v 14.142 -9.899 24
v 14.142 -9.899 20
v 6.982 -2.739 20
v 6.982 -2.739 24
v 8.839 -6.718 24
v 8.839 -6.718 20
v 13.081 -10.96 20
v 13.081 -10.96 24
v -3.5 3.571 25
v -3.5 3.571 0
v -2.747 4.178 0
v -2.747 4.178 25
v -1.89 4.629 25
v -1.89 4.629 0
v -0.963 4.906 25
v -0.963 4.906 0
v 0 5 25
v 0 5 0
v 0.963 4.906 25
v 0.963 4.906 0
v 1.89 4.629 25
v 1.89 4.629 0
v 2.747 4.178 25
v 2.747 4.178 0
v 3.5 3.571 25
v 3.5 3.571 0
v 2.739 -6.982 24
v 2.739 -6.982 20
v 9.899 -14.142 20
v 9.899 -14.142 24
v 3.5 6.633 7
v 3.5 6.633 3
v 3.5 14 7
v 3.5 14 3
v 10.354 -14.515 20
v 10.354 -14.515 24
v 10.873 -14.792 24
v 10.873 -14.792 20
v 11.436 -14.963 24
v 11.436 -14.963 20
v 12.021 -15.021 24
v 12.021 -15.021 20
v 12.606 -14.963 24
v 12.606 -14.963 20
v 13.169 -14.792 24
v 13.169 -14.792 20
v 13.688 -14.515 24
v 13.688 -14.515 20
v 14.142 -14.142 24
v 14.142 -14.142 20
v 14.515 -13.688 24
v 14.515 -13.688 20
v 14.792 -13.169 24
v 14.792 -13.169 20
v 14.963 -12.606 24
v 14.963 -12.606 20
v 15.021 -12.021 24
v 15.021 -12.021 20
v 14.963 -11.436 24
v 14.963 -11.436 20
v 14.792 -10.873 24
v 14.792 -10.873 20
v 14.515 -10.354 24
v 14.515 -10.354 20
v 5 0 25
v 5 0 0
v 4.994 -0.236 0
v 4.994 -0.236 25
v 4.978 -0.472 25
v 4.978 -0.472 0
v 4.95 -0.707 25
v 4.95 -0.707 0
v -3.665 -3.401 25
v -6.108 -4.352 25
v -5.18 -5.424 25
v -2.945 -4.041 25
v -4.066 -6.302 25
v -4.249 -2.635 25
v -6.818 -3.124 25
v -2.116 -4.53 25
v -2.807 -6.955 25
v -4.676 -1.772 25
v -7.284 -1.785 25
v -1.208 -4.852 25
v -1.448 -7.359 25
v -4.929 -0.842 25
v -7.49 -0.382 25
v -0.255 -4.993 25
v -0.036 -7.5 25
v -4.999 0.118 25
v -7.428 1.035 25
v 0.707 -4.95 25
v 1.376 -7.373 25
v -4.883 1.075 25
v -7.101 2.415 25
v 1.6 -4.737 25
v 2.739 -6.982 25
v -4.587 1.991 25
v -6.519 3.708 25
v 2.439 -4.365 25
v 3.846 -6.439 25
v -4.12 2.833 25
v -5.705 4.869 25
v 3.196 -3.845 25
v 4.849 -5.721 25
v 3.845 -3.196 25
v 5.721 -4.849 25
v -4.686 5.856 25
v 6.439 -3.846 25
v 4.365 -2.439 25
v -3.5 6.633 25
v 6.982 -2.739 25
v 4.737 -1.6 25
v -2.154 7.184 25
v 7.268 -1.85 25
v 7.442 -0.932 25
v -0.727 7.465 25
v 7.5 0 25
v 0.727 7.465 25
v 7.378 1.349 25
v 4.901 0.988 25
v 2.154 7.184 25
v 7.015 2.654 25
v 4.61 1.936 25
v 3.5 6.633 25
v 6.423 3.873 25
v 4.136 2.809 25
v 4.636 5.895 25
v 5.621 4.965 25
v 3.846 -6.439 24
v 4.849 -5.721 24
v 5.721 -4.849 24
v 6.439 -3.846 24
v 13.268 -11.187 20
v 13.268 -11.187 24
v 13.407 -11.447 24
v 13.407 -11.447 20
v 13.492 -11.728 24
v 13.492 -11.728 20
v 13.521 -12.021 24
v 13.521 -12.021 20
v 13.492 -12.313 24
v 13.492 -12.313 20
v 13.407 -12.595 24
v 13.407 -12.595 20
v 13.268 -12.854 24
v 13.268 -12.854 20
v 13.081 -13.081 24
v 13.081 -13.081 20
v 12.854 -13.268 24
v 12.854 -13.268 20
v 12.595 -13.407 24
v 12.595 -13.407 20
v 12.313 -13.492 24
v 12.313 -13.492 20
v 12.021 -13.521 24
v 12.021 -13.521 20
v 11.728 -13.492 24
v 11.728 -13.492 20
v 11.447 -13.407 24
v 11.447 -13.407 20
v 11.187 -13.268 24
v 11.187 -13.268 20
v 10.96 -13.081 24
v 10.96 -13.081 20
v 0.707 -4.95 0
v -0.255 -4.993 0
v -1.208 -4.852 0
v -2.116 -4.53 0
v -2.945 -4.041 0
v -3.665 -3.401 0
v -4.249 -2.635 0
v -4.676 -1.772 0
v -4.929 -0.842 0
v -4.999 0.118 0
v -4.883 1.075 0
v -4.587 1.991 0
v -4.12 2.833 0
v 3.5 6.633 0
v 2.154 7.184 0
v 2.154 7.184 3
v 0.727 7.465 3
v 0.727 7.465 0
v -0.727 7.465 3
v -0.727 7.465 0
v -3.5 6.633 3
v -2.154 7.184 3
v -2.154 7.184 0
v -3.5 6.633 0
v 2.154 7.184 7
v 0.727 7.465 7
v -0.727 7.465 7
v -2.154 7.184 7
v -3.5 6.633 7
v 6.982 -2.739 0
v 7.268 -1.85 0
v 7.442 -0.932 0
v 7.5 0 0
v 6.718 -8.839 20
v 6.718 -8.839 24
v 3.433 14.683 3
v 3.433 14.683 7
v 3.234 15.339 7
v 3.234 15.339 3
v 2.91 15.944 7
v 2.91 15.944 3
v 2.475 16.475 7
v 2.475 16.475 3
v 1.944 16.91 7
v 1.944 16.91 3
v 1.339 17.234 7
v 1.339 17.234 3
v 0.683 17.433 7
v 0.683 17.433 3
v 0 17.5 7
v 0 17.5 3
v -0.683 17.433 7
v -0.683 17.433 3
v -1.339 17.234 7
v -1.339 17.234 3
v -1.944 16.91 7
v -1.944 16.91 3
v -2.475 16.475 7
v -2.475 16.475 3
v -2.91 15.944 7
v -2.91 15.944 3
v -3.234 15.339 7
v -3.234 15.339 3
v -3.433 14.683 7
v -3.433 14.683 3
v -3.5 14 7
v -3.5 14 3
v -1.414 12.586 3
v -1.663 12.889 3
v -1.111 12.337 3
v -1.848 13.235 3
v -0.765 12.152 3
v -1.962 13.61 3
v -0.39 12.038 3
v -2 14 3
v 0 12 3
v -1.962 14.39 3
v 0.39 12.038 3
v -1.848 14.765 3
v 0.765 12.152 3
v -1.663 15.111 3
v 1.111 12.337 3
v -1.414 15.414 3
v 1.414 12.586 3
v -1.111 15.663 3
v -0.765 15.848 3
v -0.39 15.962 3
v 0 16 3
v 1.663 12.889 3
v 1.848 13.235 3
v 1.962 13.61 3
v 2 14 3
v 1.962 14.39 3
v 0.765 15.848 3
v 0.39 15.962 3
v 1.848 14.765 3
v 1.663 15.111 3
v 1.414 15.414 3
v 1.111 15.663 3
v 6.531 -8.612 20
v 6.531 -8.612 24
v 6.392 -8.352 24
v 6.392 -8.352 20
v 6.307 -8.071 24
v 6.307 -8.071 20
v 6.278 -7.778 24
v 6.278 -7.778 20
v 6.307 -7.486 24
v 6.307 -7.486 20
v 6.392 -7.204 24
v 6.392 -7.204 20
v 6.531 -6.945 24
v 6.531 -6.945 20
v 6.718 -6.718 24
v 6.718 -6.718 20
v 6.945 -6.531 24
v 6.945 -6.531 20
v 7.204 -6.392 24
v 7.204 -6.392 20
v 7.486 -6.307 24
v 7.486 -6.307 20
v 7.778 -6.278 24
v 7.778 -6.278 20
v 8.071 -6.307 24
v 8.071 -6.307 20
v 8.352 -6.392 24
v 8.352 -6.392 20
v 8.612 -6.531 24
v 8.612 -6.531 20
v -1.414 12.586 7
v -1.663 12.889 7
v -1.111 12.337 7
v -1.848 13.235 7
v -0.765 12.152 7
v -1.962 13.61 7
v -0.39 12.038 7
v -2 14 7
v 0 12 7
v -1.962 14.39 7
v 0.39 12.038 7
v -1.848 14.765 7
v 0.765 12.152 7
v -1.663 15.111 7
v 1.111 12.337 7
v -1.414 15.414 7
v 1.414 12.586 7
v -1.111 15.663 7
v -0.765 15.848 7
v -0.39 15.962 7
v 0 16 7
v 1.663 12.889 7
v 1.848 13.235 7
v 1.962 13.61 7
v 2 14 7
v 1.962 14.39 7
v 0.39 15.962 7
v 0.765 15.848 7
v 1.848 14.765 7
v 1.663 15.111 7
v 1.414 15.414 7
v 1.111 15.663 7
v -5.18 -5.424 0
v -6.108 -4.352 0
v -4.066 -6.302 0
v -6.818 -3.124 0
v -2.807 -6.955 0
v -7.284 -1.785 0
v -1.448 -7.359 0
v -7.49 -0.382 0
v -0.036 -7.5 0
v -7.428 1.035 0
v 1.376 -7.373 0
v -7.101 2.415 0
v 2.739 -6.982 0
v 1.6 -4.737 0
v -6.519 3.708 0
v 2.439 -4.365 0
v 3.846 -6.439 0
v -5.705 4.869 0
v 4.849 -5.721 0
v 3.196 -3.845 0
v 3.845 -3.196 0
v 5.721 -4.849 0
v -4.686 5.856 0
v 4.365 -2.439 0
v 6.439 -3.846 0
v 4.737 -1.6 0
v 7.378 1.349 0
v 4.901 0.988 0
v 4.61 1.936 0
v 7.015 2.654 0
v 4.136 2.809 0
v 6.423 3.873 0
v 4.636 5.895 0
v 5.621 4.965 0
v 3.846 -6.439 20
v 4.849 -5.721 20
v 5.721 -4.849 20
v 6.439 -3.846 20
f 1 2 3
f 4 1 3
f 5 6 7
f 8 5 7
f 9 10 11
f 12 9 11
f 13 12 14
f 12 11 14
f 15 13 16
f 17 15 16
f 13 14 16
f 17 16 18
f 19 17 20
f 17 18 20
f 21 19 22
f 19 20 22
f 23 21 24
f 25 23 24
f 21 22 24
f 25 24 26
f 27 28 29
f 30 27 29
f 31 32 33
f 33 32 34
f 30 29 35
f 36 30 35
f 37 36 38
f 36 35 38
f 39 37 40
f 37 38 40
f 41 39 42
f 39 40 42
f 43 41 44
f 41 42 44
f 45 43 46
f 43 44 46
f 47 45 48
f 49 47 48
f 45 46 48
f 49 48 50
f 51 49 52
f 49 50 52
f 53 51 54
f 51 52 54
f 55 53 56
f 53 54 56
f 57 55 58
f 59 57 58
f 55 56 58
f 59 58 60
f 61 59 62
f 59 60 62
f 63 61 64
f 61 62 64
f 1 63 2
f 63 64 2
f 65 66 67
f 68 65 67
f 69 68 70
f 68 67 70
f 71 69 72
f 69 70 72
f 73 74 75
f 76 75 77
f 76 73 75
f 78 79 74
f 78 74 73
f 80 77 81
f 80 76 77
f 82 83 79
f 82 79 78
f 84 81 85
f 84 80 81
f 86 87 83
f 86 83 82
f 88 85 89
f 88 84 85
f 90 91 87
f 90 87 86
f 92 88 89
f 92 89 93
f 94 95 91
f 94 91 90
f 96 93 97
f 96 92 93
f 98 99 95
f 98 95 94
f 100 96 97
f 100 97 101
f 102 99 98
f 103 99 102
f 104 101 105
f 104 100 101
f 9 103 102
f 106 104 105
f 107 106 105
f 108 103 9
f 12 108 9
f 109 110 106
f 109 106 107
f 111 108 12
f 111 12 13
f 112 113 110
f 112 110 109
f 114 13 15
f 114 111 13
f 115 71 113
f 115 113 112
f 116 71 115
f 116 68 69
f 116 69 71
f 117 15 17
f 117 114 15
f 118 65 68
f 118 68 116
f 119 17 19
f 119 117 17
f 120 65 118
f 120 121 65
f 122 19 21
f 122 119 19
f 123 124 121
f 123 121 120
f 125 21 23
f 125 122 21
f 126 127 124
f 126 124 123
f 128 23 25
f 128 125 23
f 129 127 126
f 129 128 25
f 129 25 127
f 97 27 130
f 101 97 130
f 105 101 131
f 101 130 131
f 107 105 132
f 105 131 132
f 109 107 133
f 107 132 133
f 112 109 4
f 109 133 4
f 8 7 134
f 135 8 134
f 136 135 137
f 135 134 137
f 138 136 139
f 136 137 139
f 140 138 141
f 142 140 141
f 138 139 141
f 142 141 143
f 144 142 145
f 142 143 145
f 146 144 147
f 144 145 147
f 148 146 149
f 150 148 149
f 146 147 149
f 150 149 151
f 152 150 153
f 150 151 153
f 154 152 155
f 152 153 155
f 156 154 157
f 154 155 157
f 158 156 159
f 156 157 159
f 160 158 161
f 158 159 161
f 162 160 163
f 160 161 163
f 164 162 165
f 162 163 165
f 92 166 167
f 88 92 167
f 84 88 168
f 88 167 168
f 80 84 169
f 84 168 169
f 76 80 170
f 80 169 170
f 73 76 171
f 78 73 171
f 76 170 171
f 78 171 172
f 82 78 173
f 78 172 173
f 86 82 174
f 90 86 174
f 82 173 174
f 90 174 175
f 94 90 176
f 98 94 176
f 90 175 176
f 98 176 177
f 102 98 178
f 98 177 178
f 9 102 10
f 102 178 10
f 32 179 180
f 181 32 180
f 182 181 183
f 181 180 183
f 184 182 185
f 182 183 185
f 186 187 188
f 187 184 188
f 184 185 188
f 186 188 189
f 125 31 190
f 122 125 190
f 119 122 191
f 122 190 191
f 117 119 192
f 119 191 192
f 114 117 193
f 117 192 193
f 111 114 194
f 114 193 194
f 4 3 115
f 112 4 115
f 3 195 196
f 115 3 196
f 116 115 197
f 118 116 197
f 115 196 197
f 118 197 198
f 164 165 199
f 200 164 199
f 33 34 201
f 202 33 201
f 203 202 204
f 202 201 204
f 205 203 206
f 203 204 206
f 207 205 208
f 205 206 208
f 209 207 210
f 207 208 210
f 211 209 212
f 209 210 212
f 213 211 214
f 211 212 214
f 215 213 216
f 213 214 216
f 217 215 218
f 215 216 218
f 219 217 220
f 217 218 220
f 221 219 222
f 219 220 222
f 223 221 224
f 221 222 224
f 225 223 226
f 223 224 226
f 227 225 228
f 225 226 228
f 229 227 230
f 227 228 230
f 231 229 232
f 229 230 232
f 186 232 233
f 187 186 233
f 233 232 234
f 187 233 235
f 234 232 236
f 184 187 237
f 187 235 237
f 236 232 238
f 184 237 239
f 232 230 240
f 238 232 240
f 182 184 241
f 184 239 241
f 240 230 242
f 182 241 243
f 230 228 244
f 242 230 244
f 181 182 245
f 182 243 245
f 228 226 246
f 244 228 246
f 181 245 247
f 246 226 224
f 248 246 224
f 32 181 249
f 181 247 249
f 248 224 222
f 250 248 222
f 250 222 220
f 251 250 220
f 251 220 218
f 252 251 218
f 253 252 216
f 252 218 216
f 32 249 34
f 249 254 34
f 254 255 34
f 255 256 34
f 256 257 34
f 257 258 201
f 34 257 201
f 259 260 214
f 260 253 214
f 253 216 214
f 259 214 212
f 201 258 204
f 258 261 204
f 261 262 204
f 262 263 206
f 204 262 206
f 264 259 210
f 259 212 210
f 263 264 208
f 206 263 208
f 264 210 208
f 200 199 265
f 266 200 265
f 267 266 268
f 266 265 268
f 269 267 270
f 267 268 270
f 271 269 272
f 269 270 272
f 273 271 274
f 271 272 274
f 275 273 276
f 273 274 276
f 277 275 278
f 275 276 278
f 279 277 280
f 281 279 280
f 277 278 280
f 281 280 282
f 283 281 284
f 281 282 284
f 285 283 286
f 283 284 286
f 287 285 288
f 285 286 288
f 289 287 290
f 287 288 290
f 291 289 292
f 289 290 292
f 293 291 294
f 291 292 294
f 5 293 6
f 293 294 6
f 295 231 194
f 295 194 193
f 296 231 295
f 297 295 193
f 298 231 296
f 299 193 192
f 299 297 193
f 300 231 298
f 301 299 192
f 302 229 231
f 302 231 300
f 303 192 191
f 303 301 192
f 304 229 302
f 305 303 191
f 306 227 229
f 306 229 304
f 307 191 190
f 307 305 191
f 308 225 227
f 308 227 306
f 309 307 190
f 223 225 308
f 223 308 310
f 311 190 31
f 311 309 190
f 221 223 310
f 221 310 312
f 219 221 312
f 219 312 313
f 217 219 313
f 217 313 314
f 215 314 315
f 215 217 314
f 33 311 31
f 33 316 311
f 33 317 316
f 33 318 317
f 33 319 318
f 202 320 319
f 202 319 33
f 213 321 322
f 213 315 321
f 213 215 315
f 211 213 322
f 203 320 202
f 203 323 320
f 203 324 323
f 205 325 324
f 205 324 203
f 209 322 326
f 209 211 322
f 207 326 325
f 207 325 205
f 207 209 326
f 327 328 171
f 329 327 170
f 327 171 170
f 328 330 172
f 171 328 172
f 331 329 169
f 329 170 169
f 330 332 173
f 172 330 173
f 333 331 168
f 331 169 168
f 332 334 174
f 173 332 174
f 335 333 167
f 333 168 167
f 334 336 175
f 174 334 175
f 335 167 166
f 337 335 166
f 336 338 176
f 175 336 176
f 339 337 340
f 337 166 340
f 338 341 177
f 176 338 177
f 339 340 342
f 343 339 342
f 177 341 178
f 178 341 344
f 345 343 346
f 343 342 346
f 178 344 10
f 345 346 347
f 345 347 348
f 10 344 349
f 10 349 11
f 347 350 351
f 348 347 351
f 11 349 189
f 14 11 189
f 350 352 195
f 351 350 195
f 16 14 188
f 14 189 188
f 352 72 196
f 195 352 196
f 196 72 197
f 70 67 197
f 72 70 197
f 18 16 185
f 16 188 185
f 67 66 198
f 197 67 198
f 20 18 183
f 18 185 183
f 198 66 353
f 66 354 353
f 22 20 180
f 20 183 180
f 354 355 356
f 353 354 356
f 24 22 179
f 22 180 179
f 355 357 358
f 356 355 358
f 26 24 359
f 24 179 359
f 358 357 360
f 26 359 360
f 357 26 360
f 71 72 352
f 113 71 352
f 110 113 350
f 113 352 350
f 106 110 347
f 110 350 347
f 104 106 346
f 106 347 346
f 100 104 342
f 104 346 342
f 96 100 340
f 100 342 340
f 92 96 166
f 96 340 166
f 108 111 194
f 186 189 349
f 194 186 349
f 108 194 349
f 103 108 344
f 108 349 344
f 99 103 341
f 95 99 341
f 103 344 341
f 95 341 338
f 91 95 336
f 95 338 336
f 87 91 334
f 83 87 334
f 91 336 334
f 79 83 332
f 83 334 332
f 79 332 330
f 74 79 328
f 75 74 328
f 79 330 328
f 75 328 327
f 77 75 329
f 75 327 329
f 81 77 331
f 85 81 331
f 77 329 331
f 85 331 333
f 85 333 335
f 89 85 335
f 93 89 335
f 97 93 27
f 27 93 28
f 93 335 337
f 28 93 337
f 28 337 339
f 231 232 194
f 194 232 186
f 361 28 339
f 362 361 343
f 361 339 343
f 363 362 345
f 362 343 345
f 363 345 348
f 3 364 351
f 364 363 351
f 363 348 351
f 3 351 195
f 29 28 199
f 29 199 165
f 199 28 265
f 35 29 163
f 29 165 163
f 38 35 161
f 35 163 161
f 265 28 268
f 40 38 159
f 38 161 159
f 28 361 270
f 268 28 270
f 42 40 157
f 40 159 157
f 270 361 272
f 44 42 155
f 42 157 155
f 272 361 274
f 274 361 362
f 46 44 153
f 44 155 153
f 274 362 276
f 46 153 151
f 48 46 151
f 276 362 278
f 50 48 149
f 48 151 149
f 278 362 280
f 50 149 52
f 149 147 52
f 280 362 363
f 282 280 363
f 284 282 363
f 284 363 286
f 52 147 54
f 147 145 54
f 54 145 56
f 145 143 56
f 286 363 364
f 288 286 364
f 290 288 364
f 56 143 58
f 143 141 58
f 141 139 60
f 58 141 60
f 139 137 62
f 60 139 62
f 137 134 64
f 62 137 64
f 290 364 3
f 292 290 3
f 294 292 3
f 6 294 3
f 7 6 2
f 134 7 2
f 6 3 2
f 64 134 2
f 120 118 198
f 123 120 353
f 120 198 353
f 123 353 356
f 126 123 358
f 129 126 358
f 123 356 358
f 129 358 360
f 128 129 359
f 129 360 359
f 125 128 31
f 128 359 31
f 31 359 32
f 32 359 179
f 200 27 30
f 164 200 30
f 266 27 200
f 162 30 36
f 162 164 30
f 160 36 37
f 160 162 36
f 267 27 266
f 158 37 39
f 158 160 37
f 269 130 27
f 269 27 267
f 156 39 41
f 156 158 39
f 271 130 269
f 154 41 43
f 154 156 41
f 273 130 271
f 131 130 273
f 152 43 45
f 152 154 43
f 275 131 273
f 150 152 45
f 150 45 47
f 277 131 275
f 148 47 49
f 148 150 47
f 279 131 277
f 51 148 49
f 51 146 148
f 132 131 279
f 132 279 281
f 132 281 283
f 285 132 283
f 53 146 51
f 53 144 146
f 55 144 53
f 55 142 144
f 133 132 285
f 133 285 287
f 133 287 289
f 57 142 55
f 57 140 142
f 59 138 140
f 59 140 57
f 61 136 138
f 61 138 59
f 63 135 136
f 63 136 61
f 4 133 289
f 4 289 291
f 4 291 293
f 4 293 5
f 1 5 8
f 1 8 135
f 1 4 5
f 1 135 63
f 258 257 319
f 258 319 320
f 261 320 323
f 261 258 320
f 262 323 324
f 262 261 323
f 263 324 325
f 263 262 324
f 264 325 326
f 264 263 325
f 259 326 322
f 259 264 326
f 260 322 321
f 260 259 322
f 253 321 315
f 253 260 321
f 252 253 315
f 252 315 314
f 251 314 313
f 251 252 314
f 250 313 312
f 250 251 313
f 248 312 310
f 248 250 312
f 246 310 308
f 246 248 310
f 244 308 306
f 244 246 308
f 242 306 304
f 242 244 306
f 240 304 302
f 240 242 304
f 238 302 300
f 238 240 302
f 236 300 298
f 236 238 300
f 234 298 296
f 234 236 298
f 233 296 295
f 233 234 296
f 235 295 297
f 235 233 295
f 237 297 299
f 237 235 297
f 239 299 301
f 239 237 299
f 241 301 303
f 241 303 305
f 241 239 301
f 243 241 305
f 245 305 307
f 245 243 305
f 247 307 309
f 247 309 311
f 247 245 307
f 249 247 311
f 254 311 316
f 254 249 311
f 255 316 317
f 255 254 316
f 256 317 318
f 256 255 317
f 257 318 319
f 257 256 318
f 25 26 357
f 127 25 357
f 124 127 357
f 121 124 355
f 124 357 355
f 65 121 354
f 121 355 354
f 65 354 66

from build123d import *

# Parameters (mm, degrees)
SKETCH_1_R      = 7.5
SKETCH_1_R_2    = 5
EXTRUDE_1_DEPTH = 25
EXTRUDE_START   = 3
SKETCH_1_3_R    = 2
EXTRUDE_2_DEPTH = 4
EXTRUDE_START_2 = 20
EXTRUDE_3_DEPTH = 4


with BuildPart() as part:
    # Эскиз1 → Бобышка-Вытянуть1 (new body)
    with BuildSketch(Plane.XY):
        Circle(SKETCH_1_R)
        Circle(SKETCH_1_R_2, mode=Mode.SUBTRACT)
    extrude(amount=EXTRUDE_1_DEPTH)

    # Эскиз1<3> → Бобышка-Вытянуть2 (add)
    with BuildSketch(Plane.XY.offset(EXTRUDE_START)):
        with BuildLine():
            Line((-3.5, 14), (-3.5, 6.633249581))
            ThreePointArc((-3.5, 6.633249581), (0, 7.5), (3.5, 6.633249581))
            Line((3.5, 6.633249581), (3.5, 14))
            ThreePointArc((3.5, 14), (0, 17.5), (-3.5, 14))
        make_face()
        with Locations((0, 14)):
            Circle(SKETCH_1_3_R, mode=Mode.SUBTRACT)
    extrude(amount=EXTRUDE_2_DEPTH)

    # Эскиз1<4> → Бобышка-Вытянуть3 (add)
    with BuildSketch(Plane.XY.offset(EXTRUDE_START_2)):
        with BuildLine():
            ThreePointArc((6.981875867, -2.73923518), (5.303300859, -5.303300859), (2.73923518, -6.981875867))
            Line((2.73923518, -6.981875867), (9.899494937, -14.142135624))
            ThreePointArc((9.899494937, -14.142135624), (14.142135624, -14.142135624), (14.142135624, -9.899494937))
            Line((14.142135624, -9.899494937), (6.981875867, -2.73923518))
        make_face()
        with BuildLine():
            ThreePointArc((13.081475452, -10.960155108), (13.081475452, -13.081475452), (10.960155108, -13.081475452))
            Line((10.960155108, -13.081475452), (6.717514421, -8.838834765))
            ThreePointArc((6.717514421, -8.838834765), (6.717514421, -6.717514421), (8.838834765, -6.717514421))
            Line((8.838834765, -6.717514421), (13.081475452, -10.960155108))
        make_face(mode=Mode.SUBTRACT)
    extrude(amount=EXTRUDE_3_DEPTH)


solid = part.part
